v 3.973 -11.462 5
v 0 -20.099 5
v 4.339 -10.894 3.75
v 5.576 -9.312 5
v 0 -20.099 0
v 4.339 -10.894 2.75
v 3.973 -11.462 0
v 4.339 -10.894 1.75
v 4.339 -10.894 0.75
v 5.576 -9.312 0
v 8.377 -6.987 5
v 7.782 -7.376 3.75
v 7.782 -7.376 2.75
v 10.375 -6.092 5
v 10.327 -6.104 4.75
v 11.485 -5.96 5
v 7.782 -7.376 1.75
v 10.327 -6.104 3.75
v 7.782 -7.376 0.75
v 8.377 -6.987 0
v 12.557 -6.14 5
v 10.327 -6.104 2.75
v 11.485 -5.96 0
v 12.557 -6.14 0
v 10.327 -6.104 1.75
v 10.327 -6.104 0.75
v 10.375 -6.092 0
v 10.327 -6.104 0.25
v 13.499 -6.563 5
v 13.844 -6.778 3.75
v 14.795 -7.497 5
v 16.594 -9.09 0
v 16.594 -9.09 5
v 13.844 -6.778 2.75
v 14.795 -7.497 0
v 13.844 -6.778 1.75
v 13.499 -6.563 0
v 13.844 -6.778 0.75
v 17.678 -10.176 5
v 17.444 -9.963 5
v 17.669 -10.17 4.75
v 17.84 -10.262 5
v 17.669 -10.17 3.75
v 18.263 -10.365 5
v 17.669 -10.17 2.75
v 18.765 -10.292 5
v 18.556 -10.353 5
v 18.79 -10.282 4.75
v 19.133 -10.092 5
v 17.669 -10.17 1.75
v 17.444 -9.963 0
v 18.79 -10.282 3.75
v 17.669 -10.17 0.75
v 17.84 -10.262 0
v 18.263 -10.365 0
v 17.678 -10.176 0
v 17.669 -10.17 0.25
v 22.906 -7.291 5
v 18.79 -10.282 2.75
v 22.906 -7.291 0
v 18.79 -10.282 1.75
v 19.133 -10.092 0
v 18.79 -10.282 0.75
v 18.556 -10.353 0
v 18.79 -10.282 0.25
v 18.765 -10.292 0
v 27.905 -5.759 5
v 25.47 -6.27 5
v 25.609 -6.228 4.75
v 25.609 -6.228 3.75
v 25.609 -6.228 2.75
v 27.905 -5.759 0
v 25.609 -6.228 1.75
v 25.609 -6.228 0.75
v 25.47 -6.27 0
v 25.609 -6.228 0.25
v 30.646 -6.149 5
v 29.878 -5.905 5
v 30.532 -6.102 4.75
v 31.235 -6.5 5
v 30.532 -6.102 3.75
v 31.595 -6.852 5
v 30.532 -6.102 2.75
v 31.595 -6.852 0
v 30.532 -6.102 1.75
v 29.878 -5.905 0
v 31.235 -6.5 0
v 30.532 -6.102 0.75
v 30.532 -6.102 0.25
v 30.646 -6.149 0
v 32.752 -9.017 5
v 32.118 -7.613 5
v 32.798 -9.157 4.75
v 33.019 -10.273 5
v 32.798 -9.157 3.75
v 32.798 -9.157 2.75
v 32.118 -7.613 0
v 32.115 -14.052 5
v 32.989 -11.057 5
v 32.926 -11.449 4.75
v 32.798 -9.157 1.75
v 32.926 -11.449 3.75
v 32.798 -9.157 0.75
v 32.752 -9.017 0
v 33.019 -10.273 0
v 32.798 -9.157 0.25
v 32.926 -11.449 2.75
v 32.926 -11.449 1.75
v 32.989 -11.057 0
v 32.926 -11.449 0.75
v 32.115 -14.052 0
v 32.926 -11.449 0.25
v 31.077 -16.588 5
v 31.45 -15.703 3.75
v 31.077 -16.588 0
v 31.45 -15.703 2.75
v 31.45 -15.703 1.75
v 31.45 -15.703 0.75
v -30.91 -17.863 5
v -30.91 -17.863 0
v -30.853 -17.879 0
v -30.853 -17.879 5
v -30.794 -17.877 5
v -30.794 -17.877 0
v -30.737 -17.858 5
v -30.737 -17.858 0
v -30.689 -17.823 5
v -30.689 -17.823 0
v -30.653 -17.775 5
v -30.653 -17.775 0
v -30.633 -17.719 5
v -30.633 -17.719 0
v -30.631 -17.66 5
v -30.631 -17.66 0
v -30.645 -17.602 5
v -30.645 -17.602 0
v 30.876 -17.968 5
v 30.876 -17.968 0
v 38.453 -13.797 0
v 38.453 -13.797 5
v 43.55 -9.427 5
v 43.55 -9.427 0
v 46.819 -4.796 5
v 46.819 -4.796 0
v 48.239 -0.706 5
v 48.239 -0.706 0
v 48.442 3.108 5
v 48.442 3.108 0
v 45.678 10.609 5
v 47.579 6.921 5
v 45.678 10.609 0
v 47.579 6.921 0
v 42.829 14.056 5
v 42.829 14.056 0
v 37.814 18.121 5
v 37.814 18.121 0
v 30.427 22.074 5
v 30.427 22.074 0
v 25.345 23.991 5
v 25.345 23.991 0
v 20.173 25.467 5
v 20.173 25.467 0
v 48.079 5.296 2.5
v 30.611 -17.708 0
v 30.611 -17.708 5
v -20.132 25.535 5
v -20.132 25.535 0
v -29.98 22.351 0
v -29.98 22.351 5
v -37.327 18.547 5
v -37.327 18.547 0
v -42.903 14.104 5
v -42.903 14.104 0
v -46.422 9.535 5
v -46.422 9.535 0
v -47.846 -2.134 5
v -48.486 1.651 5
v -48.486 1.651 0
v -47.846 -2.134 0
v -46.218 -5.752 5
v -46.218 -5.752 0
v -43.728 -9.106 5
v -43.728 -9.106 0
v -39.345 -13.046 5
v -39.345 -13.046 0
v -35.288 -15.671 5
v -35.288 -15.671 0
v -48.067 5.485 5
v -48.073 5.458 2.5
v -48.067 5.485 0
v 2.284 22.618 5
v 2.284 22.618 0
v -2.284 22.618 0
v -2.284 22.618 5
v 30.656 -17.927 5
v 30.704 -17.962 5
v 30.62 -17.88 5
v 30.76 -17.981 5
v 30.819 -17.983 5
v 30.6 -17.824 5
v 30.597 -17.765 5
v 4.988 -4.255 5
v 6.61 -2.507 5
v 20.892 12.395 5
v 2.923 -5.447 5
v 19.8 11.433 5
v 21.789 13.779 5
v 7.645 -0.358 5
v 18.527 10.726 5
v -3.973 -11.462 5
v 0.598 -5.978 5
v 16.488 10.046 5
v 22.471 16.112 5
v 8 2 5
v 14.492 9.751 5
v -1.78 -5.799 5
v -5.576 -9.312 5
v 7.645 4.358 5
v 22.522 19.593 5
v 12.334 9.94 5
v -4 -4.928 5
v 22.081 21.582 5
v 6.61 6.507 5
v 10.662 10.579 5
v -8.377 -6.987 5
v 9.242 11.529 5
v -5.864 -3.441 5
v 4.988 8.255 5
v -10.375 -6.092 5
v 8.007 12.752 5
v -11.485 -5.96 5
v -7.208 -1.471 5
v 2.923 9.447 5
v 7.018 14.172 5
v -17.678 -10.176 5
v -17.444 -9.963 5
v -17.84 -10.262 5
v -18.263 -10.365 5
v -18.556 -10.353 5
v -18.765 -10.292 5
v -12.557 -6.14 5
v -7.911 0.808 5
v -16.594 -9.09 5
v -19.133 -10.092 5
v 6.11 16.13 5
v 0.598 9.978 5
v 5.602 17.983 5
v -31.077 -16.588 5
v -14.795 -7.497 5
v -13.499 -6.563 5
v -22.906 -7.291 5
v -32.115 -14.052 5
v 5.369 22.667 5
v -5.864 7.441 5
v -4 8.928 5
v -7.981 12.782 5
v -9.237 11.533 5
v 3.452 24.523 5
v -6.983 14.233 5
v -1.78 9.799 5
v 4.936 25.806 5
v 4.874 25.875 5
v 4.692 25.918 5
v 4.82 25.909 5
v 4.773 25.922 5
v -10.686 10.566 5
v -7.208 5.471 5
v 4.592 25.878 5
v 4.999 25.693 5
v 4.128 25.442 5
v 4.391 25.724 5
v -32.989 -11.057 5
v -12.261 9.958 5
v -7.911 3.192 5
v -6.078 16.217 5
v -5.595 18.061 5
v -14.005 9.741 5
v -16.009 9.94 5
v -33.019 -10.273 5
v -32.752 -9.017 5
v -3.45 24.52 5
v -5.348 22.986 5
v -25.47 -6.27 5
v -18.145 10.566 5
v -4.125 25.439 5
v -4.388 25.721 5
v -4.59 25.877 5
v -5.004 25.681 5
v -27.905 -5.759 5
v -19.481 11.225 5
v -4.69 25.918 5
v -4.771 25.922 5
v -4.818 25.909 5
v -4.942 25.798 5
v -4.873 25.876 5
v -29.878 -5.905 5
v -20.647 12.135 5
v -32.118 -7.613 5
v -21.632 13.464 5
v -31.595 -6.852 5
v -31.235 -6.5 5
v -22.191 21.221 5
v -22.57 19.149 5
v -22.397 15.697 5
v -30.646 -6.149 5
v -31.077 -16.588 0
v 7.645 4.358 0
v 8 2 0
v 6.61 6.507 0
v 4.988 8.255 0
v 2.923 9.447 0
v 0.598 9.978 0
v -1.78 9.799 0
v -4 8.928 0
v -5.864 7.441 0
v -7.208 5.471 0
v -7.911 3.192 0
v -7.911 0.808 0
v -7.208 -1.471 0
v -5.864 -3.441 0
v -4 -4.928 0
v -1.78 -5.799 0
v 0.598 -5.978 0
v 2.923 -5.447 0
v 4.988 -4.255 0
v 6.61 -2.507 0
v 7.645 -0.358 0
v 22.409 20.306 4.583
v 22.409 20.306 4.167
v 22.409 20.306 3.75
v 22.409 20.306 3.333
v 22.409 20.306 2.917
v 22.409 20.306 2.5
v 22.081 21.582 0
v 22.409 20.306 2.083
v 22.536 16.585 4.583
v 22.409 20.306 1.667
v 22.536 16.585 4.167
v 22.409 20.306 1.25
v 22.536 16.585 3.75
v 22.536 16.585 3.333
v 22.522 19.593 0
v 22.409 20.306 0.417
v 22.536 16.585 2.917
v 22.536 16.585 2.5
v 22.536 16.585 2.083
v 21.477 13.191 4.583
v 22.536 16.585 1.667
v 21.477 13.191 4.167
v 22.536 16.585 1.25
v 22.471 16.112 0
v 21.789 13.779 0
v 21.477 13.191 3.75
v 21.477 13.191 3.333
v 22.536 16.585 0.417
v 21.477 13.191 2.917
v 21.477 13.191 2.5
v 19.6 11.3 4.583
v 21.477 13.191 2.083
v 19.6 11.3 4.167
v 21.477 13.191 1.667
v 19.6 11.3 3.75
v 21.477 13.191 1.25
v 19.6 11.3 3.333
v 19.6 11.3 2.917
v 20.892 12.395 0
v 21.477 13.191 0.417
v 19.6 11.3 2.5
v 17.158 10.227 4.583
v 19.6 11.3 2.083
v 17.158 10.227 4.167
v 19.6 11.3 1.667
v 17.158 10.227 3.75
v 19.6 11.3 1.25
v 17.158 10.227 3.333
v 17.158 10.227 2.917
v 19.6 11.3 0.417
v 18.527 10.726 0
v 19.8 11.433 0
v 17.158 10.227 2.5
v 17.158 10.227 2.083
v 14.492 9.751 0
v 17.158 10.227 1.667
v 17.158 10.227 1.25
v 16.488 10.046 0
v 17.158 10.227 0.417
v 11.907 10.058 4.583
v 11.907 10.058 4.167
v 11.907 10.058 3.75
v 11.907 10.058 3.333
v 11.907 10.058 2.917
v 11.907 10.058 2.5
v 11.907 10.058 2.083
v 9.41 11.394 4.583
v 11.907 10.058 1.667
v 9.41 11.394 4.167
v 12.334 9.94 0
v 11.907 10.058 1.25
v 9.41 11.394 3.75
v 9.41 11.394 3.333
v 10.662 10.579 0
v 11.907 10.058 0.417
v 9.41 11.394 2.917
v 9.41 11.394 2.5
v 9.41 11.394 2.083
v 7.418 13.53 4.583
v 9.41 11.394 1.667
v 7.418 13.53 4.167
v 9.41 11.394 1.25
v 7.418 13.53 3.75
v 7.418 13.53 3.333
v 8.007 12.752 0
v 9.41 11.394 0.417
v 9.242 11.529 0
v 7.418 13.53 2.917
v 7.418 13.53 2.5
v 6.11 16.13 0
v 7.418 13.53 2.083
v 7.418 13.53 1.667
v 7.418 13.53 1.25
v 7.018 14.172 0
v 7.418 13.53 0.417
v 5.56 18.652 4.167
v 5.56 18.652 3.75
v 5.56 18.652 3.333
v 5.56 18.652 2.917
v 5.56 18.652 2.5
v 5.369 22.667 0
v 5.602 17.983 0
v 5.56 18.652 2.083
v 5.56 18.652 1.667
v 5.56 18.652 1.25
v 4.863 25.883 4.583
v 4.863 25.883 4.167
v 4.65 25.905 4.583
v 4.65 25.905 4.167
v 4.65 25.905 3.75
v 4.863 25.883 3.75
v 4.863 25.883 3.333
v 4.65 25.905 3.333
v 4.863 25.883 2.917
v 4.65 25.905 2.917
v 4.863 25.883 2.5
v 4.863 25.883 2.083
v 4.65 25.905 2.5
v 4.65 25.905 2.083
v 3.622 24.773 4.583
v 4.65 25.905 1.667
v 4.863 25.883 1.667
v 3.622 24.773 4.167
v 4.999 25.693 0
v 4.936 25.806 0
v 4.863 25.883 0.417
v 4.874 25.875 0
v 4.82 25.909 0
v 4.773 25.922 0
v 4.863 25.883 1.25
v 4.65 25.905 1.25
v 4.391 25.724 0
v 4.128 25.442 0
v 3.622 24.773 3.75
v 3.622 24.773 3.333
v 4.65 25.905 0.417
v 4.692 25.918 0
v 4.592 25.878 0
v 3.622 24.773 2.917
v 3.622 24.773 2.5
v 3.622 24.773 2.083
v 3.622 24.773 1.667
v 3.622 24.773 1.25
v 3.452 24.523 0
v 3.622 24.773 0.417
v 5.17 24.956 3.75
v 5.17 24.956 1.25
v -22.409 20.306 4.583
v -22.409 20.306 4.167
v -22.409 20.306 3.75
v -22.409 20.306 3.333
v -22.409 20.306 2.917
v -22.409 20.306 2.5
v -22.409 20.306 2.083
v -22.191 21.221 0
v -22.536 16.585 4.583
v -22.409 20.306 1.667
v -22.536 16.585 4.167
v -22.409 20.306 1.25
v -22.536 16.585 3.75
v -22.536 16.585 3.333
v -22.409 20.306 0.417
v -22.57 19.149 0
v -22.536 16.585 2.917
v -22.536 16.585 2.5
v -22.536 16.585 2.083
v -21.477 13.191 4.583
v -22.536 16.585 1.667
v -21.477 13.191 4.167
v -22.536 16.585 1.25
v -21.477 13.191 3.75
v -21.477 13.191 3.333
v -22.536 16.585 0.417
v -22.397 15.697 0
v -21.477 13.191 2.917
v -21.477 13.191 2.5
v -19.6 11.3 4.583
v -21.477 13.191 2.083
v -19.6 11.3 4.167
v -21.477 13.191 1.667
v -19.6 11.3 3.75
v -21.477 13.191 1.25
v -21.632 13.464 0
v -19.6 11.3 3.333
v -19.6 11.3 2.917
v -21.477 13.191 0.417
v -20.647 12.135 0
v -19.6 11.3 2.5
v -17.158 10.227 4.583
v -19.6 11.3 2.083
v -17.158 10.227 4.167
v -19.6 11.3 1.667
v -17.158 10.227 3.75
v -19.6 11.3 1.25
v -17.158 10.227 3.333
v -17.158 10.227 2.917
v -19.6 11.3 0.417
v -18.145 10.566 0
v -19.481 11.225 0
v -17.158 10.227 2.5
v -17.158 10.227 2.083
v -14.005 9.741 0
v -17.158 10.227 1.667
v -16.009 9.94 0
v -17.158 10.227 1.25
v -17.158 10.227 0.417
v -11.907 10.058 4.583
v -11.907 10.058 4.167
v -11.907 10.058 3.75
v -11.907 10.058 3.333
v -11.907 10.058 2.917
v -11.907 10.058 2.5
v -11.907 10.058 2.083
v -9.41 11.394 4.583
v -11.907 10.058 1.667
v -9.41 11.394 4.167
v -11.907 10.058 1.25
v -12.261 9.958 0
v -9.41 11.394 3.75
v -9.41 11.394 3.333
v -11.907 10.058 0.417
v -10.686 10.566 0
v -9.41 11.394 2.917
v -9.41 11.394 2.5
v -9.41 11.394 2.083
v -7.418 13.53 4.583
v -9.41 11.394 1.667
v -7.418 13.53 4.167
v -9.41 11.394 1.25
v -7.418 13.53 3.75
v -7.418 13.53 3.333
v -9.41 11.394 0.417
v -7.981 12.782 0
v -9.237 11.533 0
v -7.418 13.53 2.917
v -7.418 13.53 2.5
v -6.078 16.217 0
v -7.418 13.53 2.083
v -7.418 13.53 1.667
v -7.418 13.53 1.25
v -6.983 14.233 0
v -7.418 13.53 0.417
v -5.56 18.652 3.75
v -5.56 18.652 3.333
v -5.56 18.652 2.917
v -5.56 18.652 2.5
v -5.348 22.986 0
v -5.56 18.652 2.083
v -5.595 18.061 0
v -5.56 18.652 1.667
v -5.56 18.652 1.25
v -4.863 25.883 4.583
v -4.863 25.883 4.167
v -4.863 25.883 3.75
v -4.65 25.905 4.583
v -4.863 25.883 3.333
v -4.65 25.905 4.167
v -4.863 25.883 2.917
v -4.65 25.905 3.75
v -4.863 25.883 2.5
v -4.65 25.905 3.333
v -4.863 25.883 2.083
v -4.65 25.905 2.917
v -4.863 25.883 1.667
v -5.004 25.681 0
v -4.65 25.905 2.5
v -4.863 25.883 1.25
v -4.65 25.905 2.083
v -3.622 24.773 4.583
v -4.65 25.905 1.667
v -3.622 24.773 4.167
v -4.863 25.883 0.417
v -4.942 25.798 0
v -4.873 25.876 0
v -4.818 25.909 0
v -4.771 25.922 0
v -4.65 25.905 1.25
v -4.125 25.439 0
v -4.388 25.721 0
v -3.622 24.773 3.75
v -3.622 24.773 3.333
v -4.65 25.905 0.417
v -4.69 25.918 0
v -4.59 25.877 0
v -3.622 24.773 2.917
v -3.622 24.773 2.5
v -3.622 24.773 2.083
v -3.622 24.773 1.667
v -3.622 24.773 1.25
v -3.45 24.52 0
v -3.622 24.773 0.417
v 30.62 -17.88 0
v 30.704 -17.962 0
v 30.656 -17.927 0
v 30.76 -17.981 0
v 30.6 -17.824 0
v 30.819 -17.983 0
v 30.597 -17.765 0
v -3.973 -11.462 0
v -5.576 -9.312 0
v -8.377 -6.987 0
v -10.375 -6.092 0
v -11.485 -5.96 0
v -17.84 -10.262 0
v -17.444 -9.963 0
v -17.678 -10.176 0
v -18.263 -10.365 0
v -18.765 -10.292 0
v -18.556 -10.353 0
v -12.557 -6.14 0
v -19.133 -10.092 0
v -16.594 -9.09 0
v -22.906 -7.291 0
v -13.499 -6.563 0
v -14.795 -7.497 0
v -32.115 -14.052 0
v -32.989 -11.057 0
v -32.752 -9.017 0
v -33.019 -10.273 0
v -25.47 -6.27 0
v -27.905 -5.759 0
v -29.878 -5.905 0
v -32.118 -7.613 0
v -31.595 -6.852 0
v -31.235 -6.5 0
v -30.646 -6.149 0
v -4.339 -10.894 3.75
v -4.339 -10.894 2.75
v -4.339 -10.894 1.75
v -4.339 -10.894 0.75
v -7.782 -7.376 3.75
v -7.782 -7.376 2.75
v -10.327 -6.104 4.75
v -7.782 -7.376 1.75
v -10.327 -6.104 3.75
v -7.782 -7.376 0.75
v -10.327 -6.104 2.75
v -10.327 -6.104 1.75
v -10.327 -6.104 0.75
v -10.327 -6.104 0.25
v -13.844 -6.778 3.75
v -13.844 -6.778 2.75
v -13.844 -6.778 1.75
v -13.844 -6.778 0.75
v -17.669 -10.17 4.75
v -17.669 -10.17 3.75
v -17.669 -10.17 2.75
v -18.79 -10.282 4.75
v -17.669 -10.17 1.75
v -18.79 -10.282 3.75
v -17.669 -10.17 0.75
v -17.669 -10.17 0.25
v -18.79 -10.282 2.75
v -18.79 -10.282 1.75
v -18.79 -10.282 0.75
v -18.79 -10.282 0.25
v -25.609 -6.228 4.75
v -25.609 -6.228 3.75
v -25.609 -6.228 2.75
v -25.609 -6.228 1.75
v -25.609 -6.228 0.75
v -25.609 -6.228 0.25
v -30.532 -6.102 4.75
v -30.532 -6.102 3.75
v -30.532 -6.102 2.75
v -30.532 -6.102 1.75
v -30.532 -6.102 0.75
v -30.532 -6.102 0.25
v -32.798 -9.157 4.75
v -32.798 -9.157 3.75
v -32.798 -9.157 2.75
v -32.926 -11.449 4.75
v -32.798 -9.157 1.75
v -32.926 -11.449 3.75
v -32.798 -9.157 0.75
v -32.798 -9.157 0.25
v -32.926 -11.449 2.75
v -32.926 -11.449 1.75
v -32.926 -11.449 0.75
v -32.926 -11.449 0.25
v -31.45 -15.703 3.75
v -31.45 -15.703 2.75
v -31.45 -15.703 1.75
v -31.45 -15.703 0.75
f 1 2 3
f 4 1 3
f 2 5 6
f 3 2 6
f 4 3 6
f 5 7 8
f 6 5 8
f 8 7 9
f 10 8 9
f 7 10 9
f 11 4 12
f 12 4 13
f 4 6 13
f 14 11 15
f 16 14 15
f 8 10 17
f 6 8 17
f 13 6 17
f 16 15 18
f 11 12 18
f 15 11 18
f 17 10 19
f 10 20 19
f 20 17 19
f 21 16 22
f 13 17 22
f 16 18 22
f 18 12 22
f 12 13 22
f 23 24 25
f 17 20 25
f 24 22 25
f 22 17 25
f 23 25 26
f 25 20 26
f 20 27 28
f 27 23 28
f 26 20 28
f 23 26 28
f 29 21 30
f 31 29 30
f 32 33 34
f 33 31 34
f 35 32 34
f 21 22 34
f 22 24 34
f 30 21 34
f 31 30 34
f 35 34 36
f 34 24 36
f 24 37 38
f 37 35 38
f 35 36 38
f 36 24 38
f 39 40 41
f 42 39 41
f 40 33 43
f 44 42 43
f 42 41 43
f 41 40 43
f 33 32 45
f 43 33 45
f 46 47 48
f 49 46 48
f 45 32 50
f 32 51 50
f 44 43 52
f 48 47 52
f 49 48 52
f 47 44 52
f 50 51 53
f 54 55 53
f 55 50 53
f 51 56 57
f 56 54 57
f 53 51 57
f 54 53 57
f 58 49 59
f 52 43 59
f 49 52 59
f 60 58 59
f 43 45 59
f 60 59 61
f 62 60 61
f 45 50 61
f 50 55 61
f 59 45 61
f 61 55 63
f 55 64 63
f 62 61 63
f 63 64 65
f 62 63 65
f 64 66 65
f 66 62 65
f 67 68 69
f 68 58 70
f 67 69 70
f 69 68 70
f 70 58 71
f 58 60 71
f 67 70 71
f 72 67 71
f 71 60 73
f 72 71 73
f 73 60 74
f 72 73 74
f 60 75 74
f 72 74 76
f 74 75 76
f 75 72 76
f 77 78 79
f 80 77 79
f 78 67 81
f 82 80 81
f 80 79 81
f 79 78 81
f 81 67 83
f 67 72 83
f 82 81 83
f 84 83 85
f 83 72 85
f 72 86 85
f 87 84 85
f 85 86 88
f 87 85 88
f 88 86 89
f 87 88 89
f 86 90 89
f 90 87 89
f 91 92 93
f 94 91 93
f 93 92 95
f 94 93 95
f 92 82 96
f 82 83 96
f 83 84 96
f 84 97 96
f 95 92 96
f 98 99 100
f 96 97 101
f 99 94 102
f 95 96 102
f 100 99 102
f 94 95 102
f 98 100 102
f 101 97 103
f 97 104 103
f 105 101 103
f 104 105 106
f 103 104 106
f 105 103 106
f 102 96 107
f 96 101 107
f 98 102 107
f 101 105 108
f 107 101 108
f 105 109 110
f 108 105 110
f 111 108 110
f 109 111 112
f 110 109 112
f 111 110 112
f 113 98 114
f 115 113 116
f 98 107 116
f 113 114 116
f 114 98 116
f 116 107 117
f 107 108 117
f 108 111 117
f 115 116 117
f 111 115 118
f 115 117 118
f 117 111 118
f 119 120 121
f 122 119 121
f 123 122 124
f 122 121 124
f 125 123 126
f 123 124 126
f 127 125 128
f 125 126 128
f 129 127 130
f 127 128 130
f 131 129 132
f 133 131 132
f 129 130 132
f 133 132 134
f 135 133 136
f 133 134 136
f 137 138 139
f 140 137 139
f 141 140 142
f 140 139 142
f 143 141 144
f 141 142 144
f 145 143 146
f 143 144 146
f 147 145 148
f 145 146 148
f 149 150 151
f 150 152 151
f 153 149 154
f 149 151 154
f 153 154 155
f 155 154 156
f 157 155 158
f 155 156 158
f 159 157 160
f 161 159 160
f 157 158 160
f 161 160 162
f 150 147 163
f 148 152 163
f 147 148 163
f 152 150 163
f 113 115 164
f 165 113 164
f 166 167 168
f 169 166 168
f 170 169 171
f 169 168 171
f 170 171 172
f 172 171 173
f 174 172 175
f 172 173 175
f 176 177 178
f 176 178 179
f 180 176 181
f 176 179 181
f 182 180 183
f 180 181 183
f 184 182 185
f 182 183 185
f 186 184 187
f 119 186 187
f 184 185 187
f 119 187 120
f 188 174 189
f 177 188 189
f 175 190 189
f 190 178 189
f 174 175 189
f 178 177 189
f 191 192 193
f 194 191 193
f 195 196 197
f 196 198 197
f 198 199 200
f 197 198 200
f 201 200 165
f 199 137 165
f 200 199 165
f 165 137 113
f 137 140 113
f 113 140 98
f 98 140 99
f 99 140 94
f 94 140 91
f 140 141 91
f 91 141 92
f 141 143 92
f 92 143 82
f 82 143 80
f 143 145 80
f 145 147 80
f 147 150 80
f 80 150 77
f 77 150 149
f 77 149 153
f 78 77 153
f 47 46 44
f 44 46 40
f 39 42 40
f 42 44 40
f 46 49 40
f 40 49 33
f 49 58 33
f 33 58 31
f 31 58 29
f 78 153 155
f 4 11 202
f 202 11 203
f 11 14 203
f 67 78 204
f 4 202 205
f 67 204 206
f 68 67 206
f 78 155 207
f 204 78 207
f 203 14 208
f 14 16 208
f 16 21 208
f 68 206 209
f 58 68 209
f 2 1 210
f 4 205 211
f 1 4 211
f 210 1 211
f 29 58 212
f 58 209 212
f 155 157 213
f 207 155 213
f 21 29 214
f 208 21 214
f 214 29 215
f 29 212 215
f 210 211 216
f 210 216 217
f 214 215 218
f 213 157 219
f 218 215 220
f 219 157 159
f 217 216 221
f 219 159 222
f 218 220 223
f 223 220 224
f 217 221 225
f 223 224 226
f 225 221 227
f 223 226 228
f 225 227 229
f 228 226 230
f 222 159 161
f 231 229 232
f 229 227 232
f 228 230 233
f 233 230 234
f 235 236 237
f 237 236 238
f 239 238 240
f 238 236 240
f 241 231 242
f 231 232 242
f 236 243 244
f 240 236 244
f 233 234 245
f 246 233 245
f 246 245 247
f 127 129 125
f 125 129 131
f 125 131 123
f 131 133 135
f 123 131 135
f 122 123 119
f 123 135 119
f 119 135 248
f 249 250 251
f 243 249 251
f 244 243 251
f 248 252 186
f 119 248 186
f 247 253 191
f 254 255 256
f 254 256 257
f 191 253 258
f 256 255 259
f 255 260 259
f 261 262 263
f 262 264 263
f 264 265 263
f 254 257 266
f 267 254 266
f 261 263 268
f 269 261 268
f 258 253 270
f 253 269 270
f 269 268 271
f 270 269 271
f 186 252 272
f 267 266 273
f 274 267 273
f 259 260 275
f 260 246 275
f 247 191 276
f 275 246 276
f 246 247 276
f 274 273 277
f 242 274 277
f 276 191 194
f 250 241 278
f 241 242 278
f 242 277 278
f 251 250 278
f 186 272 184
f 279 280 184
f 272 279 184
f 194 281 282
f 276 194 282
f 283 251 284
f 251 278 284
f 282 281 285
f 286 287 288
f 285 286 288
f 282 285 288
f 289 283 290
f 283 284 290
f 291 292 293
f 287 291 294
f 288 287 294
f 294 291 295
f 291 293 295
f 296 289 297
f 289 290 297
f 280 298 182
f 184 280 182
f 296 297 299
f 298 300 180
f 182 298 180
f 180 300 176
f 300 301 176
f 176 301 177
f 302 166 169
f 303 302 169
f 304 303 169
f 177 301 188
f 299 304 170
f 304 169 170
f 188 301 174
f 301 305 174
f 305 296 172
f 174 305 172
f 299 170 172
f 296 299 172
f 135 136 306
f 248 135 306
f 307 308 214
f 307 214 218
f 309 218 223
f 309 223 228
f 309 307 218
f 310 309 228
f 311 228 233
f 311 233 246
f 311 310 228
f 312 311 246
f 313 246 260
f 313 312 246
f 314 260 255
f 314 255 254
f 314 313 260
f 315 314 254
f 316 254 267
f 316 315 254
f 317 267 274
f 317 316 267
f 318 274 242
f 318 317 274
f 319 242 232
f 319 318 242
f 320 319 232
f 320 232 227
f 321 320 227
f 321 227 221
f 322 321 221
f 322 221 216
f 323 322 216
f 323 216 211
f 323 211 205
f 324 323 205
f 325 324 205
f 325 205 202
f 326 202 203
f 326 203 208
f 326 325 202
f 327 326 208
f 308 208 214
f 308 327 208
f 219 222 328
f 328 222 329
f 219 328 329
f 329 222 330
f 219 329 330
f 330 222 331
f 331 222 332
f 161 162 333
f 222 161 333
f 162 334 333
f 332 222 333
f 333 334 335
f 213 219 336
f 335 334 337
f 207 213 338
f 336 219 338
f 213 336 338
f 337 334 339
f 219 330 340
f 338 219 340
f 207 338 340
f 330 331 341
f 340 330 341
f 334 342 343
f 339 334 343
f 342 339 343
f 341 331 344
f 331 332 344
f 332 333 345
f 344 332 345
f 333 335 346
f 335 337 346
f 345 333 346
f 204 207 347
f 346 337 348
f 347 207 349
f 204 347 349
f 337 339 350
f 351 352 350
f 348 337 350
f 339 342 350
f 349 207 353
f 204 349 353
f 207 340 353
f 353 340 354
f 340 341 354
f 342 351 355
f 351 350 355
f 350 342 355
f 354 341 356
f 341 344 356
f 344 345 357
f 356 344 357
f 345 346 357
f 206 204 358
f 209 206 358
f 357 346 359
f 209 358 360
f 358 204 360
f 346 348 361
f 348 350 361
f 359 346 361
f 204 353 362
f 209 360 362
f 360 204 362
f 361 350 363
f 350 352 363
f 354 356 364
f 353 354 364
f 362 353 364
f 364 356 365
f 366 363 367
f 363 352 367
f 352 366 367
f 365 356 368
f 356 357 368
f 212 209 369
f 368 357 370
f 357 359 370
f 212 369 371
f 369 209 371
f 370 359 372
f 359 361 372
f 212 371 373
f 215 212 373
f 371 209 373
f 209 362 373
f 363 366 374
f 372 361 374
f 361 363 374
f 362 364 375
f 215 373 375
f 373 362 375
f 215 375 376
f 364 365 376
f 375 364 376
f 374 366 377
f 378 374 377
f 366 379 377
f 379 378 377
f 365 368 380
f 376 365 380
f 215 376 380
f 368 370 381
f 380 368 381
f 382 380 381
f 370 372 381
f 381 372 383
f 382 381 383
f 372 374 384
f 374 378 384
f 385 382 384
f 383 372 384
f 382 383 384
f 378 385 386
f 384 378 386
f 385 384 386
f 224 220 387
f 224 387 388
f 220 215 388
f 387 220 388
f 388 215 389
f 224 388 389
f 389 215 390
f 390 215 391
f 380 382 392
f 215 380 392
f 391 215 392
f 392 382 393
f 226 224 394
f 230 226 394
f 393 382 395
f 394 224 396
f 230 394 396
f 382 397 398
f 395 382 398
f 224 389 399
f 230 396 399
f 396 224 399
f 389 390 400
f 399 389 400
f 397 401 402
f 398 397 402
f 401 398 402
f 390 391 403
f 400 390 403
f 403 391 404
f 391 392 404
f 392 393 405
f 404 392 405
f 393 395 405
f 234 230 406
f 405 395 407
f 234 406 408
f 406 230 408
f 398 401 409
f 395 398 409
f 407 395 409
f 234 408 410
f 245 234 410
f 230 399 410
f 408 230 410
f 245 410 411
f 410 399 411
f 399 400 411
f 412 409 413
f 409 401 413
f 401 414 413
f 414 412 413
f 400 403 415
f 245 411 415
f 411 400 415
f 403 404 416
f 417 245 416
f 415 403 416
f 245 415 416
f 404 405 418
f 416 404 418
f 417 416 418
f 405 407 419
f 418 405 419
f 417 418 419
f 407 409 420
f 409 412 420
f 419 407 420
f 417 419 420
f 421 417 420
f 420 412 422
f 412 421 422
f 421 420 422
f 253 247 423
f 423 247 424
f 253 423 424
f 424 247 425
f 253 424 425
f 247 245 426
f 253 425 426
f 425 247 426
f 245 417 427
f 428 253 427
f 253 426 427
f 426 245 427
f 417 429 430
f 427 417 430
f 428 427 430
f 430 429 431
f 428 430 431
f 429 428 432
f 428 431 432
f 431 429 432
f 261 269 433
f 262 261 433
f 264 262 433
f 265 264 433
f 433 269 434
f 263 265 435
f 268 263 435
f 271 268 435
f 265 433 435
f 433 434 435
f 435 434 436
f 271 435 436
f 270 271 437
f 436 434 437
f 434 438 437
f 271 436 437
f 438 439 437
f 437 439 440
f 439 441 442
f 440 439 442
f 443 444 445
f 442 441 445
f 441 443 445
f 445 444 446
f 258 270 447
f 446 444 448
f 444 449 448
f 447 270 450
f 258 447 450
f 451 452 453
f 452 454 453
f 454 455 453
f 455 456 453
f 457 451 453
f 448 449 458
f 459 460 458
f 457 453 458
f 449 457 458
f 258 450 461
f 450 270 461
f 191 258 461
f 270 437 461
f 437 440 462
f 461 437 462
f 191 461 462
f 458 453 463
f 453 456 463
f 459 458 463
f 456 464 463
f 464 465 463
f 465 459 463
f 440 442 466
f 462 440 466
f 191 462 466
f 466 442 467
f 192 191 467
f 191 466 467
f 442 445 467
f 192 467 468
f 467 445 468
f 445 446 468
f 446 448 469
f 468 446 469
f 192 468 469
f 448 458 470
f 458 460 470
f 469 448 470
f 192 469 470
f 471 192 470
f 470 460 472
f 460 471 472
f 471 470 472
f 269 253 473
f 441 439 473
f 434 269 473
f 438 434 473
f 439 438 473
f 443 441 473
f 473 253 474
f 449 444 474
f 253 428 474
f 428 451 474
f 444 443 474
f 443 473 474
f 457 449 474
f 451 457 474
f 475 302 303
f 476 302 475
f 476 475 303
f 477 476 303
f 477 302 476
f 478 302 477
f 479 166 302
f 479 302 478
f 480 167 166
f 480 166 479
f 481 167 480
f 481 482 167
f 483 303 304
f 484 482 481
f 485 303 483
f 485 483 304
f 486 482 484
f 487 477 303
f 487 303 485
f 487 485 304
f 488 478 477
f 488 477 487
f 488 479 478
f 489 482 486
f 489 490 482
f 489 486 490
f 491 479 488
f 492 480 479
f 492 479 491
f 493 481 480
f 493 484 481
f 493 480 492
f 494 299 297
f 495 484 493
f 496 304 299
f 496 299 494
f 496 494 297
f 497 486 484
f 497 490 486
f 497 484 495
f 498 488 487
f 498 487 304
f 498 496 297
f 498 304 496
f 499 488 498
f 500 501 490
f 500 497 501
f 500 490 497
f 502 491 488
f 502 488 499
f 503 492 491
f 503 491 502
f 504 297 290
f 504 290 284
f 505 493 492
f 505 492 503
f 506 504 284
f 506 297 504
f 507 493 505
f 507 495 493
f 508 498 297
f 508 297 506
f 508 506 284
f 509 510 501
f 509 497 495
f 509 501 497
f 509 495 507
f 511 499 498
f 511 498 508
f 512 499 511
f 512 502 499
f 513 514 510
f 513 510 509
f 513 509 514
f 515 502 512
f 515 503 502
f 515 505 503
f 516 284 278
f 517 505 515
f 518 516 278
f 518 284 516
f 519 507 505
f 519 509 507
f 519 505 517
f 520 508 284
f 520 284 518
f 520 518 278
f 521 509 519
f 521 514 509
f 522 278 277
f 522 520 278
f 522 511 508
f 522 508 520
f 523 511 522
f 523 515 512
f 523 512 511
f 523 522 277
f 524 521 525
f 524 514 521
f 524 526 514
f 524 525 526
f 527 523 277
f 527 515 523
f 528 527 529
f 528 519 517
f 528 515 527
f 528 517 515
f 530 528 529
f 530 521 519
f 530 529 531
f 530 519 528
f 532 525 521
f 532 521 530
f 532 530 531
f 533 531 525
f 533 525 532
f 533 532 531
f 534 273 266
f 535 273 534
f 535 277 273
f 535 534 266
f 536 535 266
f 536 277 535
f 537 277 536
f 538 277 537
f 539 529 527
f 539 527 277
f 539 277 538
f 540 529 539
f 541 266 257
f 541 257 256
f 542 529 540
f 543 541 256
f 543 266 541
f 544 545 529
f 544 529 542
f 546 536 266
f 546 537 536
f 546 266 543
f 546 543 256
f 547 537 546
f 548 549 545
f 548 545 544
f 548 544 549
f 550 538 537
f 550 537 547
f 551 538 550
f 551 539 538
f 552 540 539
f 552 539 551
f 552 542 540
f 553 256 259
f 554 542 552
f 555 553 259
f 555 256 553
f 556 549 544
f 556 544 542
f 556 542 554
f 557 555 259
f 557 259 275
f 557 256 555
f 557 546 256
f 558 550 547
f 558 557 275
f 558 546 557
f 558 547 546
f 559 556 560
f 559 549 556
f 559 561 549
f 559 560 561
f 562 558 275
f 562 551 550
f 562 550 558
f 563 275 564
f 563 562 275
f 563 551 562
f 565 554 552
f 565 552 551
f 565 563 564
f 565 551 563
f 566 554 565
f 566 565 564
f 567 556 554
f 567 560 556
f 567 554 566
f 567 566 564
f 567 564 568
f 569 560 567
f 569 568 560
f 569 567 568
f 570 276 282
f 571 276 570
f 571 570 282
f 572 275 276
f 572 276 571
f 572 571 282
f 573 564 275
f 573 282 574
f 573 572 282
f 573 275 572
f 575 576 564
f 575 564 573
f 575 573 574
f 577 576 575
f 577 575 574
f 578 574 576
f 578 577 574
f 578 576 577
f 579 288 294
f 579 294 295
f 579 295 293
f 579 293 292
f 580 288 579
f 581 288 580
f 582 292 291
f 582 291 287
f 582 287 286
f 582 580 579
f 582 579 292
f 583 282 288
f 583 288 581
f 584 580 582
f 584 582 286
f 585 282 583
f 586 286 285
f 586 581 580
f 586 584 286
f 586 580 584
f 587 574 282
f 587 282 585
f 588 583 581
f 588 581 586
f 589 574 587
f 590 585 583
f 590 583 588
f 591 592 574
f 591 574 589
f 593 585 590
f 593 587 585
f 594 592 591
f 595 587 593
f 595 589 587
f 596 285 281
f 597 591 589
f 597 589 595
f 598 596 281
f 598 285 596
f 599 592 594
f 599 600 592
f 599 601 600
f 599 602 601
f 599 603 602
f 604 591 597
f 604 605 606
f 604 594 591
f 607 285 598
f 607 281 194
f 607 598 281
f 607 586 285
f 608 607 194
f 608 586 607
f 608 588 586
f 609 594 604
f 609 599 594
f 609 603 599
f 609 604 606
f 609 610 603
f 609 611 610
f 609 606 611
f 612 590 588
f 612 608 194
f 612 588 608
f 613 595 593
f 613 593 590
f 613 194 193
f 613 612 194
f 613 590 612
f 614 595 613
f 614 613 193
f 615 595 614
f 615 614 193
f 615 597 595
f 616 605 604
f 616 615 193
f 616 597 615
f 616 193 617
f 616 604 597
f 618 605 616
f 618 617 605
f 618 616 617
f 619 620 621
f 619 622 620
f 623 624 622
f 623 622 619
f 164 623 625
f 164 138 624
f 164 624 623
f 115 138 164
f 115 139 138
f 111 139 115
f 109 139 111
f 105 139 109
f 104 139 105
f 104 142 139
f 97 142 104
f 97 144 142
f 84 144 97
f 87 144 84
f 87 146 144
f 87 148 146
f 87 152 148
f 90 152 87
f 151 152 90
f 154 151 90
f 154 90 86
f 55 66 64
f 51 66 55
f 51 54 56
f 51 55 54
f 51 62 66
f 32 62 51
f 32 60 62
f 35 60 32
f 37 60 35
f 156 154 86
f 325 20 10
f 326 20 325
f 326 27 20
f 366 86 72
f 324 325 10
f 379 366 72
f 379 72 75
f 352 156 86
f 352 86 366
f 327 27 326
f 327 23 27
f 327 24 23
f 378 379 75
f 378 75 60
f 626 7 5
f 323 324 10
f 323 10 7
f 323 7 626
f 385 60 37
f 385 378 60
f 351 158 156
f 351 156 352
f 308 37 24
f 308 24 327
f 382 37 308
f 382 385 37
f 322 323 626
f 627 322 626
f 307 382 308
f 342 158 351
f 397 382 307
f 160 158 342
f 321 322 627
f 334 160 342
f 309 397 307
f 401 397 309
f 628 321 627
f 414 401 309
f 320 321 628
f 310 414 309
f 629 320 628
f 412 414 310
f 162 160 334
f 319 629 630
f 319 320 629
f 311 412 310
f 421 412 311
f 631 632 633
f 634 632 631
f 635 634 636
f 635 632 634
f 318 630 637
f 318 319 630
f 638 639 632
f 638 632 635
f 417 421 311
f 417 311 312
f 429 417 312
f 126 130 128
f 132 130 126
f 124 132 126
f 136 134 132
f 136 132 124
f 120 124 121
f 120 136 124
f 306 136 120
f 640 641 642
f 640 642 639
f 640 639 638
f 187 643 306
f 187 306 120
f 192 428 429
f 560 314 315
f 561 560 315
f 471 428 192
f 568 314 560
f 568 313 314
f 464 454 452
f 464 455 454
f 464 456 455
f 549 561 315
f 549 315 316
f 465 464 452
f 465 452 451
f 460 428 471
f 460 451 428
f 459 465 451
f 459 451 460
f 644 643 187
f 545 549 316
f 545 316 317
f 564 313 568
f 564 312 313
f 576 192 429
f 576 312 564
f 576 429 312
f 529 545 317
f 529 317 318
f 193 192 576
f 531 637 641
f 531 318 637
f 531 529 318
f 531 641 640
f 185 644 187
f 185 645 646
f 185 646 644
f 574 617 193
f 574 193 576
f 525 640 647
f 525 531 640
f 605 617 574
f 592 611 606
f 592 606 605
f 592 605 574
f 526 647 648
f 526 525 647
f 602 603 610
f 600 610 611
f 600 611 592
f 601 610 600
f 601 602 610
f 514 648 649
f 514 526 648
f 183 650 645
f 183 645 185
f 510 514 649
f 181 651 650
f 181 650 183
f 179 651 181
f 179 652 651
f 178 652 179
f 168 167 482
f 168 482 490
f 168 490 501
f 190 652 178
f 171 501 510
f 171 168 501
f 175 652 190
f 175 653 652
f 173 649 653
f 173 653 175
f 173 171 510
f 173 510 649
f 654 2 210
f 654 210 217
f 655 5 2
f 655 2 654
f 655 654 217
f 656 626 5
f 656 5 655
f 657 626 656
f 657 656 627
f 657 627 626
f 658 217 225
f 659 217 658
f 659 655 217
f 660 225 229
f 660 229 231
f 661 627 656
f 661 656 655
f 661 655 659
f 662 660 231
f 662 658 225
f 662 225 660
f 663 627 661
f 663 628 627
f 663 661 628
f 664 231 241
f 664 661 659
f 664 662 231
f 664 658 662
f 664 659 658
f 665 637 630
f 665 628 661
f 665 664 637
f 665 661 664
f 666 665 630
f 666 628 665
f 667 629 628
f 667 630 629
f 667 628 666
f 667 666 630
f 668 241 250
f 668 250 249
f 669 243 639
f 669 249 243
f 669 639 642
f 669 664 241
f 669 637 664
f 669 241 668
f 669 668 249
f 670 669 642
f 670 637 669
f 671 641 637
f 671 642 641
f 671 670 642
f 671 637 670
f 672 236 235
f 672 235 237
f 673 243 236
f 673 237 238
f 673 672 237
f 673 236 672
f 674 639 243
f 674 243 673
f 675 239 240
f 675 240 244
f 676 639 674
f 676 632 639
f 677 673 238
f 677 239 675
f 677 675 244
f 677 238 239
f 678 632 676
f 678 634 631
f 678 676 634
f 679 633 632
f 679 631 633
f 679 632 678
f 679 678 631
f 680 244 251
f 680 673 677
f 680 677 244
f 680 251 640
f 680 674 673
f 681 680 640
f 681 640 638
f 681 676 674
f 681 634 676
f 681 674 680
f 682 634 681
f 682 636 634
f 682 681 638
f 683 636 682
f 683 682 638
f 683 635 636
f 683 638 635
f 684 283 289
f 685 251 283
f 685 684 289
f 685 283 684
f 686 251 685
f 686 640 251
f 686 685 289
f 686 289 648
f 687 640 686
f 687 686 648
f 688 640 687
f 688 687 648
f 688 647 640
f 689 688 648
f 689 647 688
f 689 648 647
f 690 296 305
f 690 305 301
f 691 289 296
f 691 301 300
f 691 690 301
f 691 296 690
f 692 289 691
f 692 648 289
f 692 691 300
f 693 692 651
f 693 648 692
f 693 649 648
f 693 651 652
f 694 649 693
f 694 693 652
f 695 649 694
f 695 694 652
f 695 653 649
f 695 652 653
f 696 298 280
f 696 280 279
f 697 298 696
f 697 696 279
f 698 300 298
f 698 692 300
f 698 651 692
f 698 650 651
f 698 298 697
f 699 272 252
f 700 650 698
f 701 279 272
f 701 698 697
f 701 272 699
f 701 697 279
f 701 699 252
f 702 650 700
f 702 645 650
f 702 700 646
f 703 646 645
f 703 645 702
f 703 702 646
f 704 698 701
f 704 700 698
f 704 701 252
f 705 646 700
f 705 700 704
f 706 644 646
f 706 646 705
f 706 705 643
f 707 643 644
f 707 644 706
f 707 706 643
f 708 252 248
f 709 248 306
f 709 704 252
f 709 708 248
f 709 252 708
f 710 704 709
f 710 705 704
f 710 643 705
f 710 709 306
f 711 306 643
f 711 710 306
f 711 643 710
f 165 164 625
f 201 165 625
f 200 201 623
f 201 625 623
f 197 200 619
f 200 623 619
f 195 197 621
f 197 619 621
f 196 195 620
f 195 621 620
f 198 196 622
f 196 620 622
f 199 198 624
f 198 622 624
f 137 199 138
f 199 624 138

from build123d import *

# Parameters (mm, degrees)
F0_R     = 8
F1_DEPTH = 5
F3_DEPTH = 4


with BuildPart() as f1:
    # F0 (on Top) → F1 (new body)
    with BuildSketch(Plane.XY):
        with BuildLine():
            add(Edge.make_bspline(
                [(-20.1322957873, 25.53460747), (-21.0725770911, 23.9520868943), (-23.0675364795, 20.5945126588), (-22.4083503956, 12.5748714923), (-17.2545951615, 9.8940808299), (-11.7086679234, 9.3422404959), (-7.114333286, 13.0419839582), (-5.6318764107, 17.419362352), (-5.5542005863, 18.4921153575), (-5.3315524161, 24.6973197099), (-4.9661057562, 25.9294604037), (-4.5074860116, 25.9467043834), (-3.4902695158, 24.6726371533), (-2.7201798677, 23.361339468), (-2.2836024873, 22.6179417223)],
                knots=[0, 0, 0, 0, 0.1081257875, 0.2294064064, 0.3330379483, 0.4368181362, 0.544679837, 0.6371461796, 0.6891819735, 0.8016006001, 0.8496450245, 0.8727865852, 0.9278804753, 1, 1, 1, 1], degree=3))
            add(Edge.make_bspline(
                [(-20.1322957873, 25.53460747), (-90.5536915685, 8.5128706396), (-30.9104166947, -17.8634751536)],
                knots=[5.141586245, 5.141586245, 5.141586245, 7.1638946044, 7.1638946044, 7.1638946044], degree=2, weights=[1, 0.5308829712, 1]))
            ThreePointArc((-30.9104166947, -17.8634751536), (-30.6891133476, -17.8229854876), (-30.6454839702, -17.602279661))
            Line((-30.6454839702, -17.602279661), (-31.0767631014, -16.5883528518))
            add(Edge.make_bspline(
                [(0, -20.0992897153), (-1.3823299374, -16.6632151248), (-3.7259810905, -10.8375725204), (-7.5260810857, -7.3540536255), (-10.2155748152, -5.9585527548), (-12.159885229, -5.9007804143), (-13.9277435294, -6.6856686943), (-15.8876446758, -8.4566903444), (-17.2027866447, -9.625962135), (-17.6119279245, -10.2090003219), (-18.205738536, -10.3912681874), (-18.8799205861, -10.3620367326), (-20.2756503106, -9.1882203841), (-22.5170394795, -7.2842527027), (-25.5839259266, -6.1758196411), (-28.0957601751, -5.5861032814), (-30.5977671217, -5.9574582263), (-31.8337397225, -6.9177842225), (-32.9574722494, -9.2281070864), (-33.2056830629, -11.4377087655), (-31.7142961508, -15.0797440223), (-31.1854537564, -16.3327778446), (-31.0767631014, -16.5883528518)],
                knots=[0, 0, 0, 0, 0.1032899111, 0.175121375, 0.2297330056, 0.2731452478, 0.317504144, 0.3708234335, 0.4136208246, 0.4398804052, 0.4640120942, 0.4891444143, 0.531502959, 0.5878668134, 0.6462452968, 0.6987102959, 0.7485485888, 0.788300273, 0.8383671978, 0.8874172647, 0.9561263015, 0.9764684836, 0.9764684836, 0.9764684836, 0.9764684836], degree=3))
            add(Edge.make_bspline(
                [(0, -20.0992897153), (1.3823299374, -16.6632151248), (3.7259810905, -10.8375725204), (7.5260810857, -7.3540536255), (10.2155748152, -5.9585527548), (12.159885229, -5.9007804143), (13.9277435294, -6.6856686943), (15.8876446758, -8.4566903444), (17.2027866447, -9.625962135), (17.6119279245, -10.2090003219), (18.205738536, -10.3912681874), (18.8799205861, -10.3620367326), (20.2756503106, -9.1882203841), (22.5170394795, -7.2842527027), (25.5839259266, -6.1758196411), (28.0957601751, -5.5861032814), (30.5977671217, -5.9574582263), (31.8337397225, -6.9177842225), (32.9574722494, -9.2281070864), (33.2056830629, -11.4377087655), (31.7142961508, -15.0797440223), (31.1854537564, -16.3327778446), (31.0767631014, -16.5883528518)],
                knots=[0, 0, 0, 0, 0.1032899111, 0.175121375, 0.2297330056, 0.2731452478, 0.317504144, 0.3708234335, 0.4136208246, 0.4398804052, 0.4640120942, 0.4891444143, 0.531502959, 0.5878668134, 0.6462452968, 0.6987102959, 0.7485485888, 0.788300273, 0.8383671978, 0.8874172647, 0.9561263015, 0.9764684836, 0.9764684836, 0.9764684836, 0.9764684836], degree=3))
            Line((31.0767631014, -16.5883528518), (30.6113448061, -17.7075706361))
            ThreePointArc((30.6113448061, -17.7075706361), (30.6559562722, -17.9271357895), (30.8763370515, -17.9675257836))
            add(Edge.make_bspline(
                [(30.876337032, -17.9675257922), (90.5643788989, 8.2077761409), (20.1726411379, 25.4667009928)],
                knots=[2.2621161258, 2.2621161258, 2.2621161258, 4.2844215213, 4.2844215213, 4.2844215213], degree=2, weights=[1, 0.5308842271, 1]))
            add(Edge.make_bspline(
                [(20.1726411379, 25.4667009928), (21.0993637505, 23.9067183821), (23.0644753961, 20.5572715955), (22.4083503956, 12.5748714923), (17.2545951615, 9.8940808299), (11.7086679234, 9.3422404959), (7.114333286, 13.0419839582), (5.6318764107, 17.419362352), (5.5542005863, 18.4921153575), (5.3315524161, 24.6973197099), (4.9661057562, 25.9294604037), (4.5074860116, 25.9467043834), (3.4902695158, 24.6726371533), (2.7201798677, 23.361339468), (2.2836024873, 22.6179417223)],
                knots=[0.0015465389, 0.0015465389, 0.0015465389, 0.0015465389, 0.1081257875, 0.2294064064, 0.3330379483, 0.4368181362, 0.544679837, 0.6371461796, 0.6891819735, 0.8016006001, 0.8496450245, 0.8727865852, 0.9278804753, 1, 1, 1, 1], degree=3))
            Line((2.2836024873, 22.6179417223), (0, 22.6179417223))
            Line((0, 22.6179417223), (-2.2836024873, 22.6179417223))
        make_face()
        with Locations((0, 2)):
            Circle(F0_R, mode=Mode.SUBTRACT)
    extrude(amount=F1_DEPTH)

    # F2 (on face) → F3 (join)
    with BuildSketch(Plane.XY.offset(5)):
        Polygon((4.1170143522, 20.9352653474), (-3.8109705783, 21.1286321282), (-7.0981839672, 9.9134324118), (-1.6839501914, 10.880259797), (3.0535049736, 10.5902114883), (6.9208149798, 9.3333357945), (5.8573042043, 13.5873770341), align=None)
        Polygon((3.9236498997, -7.5861448422), (-3.0375095084, -7.4894623831), (-3.4242400434, -8.843020536), (0.3463879693, -15.2240833268), align=None)
    extrude(amount=-F3_DEPTH)


solid = f1.part
